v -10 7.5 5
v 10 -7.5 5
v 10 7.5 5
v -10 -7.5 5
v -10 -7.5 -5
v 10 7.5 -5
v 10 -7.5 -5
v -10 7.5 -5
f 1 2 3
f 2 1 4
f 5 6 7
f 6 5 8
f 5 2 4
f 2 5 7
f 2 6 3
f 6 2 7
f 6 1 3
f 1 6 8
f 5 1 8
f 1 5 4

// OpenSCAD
// Auto-generated OpenSCAD model for: A simple phone stand with rounded edges
// Note: This is a fallback template. Install Ollama for better results.

// Parameters
height = 10;
width = 20;
depth = 15;

// Main module
module main_shape() {
    cube([width, depth, height], center=true);
}

// Render the shape
main_shape();
